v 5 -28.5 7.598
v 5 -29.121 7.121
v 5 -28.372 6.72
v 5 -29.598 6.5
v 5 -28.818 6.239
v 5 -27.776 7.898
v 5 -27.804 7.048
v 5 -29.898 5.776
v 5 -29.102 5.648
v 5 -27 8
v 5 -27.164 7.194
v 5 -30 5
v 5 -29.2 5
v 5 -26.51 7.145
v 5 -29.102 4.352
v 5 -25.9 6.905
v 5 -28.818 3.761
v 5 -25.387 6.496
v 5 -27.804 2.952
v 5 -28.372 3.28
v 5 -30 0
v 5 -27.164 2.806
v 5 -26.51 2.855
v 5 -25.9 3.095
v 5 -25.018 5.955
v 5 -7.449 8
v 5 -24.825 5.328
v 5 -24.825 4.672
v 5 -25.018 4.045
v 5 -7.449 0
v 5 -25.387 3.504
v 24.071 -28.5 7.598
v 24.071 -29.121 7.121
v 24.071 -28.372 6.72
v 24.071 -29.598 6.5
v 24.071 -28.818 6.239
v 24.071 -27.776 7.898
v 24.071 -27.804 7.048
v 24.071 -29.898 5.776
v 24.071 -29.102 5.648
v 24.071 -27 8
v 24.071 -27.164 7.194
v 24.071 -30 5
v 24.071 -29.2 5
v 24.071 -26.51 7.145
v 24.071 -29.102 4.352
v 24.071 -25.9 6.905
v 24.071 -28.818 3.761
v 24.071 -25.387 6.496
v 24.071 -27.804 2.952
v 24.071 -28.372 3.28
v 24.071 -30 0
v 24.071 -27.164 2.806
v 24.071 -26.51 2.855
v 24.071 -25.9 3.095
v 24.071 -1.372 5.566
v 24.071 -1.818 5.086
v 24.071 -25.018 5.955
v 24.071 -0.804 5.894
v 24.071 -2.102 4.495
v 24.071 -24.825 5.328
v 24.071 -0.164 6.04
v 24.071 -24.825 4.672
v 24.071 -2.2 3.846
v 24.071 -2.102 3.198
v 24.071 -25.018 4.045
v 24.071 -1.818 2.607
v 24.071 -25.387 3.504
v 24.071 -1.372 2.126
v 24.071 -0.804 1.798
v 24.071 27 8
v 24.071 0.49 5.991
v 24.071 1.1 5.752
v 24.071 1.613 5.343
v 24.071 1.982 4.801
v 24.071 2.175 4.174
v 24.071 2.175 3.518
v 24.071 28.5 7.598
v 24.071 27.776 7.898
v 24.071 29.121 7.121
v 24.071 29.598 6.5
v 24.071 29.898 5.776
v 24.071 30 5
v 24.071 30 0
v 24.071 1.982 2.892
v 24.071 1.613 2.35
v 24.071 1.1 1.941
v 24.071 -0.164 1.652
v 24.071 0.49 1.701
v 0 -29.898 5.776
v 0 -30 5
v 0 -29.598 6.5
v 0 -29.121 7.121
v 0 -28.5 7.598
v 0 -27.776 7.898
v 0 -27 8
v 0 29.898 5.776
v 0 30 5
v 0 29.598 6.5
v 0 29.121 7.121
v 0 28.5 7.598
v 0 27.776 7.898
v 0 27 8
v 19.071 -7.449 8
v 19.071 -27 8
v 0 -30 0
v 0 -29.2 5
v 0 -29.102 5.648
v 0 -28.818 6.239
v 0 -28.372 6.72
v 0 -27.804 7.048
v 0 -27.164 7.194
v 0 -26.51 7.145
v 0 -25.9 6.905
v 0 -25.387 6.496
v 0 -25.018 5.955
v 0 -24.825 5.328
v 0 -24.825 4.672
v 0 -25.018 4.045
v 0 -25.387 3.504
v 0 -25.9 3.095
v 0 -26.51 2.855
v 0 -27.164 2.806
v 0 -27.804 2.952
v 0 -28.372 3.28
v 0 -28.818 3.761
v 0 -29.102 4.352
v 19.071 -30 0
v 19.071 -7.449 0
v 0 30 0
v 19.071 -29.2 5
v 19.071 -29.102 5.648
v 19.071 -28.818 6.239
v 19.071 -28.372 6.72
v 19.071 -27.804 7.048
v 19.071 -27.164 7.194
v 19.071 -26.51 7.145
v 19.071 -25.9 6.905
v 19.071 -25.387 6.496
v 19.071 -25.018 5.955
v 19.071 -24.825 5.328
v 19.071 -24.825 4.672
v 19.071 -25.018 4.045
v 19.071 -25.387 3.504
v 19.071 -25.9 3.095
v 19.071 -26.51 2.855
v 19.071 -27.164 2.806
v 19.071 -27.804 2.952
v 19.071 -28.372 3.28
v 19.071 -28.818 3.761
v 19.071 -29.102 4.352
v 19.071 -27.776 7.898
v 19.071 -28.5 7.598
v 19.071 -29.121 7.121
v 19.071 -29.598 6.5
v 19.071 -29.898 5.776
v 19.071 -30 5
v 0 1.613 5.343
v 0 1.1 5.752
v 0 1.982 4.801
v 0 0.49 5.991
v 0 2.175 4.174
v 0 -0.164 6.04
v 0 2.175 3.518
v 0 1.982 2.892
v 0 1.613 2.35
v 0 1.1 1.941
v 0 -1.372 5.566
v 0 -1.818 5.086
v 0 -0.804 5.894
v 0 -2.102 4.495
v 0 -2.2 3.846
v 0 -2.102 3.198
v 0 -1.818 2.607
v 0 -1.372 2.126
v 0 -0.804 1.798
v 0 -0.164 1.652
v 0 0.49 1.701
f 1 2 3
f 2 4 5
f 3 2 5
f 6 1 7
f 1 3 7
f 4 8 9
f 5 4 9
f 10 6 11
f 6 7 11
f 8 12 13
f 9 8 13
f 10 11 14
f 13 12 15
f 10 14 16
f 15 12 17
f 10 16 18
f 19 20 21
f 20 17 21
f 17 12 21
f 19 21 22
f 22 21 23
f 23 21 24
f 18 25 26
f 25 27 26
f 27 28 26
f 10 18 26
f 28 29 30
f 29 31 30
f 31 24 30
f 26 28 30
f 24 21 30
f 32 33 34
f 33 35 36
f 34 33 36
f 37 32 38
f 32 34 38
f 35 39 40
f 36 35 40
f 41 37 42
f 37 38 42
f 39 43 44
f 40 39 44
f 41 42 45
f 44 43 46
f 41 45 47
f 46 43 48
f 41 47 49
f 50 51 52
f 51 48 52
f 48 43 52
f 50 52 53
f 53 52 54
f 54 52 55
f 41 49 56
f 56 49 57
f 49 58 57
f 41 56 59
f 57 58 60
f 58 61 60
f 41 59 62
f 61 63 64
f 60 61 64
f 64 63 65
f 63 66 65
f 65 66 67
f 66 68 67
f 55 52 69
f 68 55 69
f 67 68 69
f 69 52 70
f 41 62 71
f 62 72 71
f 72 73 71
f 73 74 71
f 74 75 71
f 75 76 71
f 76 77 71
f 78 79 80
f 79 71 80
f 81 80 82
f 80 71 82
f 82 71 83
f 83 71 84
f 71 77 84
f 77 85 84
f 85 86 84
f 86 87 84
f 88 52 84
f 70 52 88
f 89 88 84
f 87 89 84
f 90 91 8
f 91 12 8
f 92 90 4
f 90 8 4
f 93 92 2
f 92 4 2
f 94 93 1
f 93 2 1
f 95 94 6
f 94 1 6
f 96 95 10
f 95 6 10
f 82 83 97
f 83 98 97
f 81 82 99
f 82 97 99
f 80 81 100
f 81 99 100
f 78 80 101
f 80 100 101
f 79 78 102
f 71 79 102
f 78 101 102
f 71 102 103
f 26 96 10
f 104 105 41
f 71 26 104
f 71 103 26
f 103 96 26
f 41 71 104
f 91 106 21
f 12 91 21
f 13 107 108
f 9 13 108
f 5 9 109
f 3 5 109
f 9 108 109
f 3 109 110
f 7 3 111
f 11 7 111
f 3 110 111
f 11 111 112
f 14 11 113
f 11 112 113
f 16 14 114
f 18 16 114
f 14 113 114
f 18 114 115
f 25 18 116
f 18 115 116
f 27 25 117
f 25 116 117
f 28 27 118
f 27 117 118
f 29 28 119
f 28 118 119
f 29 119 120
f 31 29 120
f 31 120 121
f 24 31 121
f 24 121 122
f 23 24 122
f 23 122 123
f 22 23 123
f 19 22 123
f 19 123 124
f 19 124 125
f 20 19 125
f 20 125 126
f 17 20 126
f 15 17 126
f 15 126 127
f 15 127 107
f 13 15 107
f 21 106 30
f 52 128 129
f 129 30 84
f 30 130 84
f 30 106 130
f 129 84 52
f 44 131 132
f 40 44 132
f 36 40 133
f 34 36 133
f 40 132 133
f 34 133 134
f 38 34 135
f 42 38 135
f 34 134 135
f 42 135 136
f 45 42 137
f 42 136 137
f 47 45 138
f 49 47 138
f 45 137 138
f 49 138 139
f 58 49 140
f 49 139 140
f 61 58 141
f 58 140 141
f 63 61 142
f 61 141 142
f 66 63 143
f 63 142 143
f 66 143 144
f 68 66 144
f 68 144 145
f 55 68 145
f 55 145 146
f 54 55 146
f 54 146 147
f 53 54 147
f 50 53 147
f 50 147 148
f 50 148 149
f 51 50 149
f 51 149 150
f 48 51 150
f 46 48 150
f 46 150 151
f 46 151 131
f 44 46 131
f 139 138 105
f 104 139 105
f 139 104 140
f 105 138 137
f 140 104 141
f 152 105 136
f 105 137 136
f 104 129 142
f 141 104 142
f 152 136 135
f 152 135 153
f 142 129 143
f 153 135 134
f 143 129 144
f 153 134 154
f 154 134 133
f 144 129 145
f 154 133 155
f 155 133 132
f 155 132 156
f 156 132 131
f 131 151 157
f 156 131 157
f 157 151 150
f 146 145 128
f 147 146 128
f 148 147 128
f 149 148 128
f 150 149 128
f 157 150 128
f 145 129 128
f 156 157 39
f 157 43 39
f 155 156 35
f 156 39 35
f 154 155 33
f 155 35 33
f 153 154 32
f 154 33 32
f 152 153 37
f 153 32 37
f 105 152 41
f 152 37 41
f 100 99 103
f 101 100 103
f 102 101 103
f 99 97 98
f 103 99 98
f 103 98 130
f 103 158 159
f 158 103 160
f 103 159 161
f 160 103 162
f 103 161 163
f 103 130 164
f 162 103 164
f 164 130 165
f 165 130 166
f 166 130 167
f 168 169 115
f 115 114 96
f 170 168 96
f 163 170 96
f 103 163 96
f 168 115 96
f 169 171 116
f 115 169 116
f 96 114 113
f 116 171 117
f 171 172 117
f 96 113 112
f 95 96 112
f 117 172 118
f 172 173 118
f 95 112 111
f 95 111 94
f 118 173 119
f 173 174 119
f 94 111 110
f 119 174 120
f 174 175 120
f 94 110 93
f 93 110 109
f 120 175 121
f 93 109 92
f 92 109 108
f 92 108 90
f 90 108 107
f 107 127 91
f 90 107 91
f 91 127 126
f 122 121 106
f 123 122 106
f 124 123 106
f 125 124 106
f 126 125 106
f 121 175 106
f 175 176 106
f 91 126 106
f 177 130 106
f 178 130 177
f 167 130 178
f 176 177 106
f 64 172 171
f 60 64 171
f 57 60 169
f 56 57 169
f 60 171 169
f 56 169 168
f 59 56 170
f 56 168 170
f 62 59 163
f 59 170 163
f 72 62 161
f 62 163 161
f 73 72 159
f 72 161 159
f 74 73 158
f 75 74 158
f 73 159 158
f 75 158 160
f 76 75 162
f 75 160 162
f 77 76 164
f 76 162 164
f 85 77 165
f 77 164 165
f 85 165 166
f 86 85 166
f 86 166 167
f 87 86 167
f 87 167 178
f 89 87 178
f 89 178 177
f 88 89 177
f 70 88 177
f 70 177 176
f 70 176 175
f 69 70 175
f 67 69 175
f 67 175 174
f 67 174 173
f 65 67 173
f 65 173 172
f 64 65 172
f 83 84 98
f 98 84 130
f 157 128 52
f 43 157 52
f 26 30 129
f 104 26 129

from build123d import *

# Parameters (mm, degrees)
F1_DEPTH = 8
F2_R     = 3
F4_D     = 4.4
F6_D     = 4.4


with BuildPart() as f1:
    # F0 (on Top) → F1 (new body)
    with BuildSketch(Plane.XY):
        Polygon((0, 30), (0, 0), (0, -30), (5, -30), (5, -7.4492068961), (19.0707250684, -7.4492068961), (19.0707250684, -30), (24.0707250684, -30), (24.0707250684, 30), align=None)
    extrude(amount=F1_DEPTH)

    # F2
    f2_edges = [f1.edges().sort_by_distance(p)[0] for p in [
        (21.570725, -30, 8),
        (2.5, -30, 8),
        (12.035363, 30, 8),
    ]]
    fillet(f2_edges, radius=F2_R)

    # F4 (through all)
    with Locations(Plane.YZ.offset(24.0707250684)):
        with Locations((-27, 5)):
            Hole(F4_D / 2)

    # F6 (through all)
    with Locations(Plane.YZ.offset(24.0707250684)):
        with Locations((0, 3.8463051897)):
            Hole(F6_D / 2)


solid = f1.part
